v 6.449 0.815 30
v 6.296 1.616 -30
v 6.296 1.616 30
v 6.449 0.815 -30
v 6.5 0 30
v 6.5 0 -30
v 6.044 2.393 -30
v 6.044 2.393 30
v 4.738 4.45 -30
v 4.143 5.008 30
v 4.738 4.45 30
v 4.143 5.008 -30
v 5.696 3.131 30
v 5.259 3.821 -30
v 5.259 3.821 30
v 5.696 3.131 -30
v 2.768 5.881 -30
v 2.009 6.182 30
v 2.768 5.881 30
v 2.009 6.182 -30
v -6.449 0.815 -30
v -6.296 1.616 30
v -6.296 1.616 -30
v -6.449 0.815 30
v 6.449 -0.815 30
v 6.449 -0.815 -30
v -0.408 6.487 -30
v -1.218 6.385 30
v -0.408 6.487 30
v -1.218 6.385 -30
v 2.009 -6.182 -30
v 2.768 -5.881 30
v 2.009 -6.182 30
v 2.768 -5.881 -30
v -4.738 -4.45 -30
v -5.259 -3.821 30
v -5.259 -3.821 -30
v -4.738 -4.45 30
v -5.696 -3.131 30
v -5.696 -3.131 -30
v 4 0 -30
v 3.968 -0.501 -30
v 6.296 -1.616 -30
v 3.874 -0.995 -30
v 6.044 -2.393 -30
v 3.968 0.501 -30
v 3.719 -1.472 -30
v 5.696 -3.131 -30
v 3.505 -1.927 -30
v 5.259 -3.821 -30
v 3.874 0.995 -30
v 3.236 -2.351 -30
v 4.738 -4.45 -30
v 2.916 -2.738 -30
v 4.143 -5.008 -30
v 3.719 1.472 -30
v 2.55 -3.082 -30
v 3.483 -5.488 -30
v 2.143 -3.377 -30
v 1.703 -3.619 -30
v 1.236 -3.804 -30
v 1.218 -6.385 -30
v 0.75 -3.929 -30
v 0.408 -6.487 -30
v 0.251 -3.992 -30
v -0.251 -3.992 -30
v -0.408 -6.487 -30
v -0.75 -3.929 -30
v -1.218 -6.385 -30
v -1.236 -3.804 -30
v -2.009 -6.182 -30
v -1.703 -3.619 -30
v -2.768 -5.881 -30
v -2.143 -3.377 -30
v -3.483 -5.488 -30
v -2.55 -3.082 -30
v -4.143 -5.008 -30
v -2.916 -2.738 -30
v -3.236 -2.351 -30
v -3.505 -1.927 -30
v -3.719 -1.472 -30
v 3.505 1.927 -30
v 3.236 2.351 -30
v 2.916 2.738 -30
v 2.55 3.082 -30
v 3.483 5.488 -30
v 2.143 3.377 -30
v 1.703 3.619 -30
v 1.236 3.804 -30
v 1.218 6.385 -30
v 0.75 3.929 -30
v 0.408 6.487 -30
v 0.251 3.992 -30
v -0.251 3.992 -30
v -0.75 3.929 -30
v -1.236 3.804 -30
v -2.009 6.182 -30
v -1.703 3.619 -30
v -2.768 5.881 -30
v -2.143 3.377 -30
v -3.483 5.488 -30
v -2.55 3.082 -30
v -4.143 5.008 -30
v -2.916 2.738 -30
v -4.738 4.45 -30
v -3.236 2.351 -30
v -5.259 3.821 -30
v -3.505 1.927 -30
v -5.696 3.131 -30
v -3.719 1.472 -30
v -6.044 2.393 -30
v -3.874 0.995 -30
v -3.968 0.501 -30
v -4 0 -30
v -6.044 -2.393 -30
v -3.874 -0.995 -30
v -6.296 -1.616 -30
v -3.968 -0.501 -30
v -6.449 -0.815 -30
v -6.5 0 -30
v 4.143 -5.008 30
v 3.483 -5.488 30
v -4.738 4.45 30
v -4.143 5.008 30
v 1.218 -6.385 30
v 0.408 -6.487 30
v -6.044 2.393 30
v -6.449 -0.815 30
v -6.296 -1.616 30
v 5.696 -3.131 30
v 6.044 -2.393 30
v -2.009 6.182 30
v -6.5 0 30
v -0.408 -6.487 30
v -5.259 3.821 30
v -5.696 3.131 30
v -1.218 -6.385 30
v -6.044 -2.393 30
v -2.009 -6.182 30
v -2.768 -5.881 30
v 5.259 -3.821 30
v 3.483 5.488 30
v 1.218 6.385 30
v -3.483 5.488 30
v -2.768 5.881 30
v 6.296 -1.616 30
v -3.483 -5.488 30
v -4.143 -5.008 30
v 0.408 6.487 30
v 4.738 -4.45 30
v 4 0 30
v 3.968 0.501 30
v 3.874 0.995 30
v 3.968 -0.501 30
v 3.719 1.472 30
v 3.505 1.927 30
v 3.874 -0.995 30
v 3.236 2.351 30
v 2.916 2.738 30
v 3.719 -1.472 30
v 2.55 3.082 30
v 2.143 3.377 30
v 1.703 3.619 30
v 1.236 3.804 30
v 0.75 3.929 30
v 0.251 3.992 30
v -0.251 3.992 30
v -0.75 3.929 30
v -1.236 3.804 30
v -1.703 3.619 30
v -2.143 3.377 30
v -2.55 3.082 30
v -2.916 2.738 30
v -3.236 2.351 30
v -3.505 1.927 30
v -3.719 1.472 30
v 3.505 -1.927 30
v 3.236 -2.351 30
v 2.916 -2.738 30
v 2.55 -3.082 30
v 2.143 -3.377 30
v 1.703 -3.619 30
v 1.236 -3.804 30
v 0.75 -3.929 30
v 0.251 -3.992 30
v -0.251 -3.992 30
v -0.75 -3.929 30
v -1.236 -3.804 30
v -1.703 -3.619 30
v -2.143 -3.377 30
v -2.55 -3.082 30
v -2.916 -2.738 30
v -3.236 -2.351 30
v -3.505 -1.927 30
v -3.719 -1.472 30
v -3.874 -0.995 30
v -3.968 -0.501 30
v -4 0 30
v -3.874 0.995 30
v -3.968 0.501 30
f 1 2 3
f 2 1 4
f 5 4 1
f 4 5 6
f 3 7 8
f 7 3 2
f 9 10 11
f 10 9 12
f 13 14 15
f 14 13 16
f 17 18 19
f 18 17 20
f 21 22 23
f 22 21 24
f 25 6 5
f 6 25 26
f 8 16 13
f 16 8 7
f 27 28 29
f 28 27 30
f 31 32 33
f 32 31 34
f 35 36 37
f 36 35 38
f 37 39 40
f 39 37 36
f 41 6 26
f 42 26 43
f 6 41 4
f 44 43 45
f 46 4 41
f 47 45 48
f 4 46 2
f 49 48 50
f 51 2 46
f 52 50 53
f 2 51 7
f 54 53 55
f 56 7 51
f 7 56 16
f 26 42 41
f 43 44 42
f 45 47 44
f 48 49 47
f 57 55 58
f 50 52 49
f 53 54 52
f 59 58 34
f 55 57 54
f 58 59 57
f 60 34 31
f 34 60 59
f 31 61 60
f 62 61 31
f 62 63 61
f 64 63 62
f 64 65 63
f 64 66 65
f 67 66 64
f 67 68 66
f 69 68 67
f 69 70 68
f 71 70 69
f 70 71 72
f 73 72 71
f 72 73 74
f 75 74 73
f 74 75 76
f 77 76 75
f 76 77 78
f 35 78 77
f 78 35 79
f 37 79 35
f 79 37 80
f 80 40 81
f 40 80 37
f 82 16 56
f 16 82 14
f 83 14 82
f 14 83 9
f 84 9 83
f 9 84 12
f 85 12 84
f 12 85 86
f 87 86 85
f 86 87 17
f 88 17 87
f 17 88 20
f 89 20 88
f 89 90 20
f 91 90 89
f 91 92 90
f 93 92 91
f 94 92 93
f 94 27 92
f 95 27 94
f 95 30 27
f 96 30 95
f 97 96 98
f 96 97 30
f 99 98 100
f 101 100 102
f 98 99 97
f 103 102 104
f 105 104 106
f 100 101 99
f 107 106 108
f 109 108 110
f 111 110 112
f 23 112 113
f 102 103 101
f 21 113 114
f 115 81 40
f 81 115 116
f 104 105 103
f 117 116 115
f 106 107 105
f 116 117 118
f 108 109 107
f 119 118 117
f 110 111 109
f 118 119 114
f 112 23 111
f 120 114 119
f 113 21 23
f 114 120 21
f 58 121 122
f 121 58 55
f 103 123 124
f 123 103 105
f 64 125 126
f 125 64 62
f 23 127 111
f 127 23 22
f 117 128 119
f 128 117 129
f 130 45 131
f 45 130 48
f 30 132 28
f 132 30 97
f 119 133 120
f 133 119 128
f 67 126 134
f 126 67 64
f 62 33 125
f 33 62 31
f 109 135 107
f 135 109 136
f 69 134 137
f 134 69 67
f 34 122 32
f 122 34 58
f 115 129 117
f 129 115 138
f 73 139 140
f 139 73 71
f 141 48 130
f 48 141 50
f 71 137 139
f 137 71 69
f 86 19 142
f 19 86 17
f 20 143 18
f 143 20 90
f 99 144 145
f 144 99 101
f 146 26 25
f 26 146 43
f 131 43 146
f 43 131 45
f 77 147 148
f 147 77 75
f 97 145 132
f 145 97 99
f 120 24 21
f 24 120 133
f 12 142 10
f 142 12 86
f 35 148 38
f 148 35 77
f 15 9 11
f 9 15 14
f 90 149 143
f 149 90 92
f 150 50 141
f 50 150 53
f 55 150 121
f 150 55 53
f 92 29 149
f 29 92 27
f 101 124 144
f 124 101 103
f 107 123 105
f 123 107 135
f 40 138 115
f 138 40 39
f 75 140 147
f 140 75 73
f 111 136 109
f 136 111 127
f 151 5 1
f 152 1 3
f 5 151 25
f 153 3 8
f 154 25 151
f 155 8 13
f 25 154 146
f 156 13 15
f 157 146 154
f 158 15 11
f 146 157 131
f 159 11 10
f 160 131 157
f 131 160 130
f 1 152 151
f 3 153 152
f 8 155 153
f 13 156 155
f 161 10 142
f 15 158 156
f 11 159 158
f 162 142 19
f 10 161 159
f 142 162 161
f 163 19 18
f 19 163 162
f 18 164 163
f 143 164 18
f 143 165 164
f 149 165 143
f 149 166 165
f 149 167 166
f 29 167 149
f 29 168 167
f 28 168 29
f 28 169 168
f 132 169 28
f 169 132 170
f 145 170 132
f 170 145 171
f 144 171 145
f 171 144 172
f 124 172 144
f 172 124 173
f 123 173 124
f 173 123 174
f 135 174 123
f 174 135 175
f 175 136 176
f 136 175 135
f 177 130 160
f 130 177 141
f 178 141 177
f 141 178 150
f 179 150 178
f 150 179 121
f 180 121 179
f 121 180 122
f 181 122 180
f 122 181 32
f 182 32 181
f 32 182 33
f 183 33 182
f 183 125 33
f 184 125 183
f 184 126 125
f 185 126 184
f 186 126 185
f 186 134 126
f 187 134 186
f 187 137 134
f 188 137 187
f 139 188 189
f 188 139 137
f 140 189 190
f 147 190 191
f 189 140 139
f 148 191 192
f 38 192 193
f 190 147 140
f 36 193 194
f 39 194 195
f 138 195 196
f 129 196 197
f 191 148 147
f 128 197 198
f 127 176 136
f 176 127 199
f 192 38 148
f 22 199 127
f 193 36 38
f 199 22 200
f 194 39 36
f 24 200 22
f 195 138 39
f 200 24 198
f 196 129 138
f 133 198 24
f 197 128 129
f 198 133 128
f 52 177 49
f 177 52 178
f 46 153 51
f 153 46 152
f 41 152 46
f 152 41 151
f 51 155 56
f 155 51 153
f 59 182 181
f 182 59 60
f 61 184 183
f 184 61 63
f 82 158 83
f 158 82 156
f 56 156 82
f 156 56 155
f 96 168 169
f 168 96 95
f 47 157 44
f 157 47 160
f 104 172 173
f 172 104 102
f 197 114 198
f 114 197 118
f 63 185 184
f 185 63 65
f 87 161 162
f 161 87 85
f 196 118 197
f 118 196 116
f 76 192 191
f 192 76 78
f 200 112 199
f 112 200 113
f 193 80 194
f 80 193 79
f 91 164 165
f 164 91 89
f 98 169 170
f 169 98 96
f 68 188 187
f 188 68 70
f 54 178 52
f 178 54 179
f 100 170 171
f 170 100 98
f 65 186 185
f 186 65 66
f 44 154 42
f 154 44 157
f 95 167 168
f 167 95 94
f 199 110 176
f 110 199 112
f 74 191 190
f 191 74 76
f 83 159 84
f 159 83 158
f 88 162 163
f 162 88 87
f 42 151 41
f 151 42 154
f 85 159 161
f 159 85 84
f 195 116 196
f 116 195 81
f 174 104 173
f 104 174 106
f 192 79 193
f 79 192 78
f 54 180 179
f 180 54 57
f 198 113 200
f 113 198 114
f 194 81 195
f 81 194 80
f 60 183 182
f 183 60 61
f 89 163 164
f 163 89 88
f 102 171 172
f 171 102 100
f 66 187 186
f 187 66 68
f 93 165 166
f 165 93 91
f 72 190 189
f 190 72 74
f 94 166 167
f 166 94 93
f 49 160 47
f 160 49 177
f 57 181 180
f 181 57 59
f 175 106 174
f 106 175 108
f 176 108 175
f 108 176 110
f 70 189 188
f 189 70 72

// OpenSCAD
$fn = 50;


difference() {
	union() {
		translate(v = [0, 0, -30.0000000000]) {
			cylinder(h = 60, r = 6.5000000000);
		}
	}
	union() {
		translate(v = [0, 0, -100.0000000000]) {
			cylinder(h = 200, r = 4.0000000000);
		}
	}
}
